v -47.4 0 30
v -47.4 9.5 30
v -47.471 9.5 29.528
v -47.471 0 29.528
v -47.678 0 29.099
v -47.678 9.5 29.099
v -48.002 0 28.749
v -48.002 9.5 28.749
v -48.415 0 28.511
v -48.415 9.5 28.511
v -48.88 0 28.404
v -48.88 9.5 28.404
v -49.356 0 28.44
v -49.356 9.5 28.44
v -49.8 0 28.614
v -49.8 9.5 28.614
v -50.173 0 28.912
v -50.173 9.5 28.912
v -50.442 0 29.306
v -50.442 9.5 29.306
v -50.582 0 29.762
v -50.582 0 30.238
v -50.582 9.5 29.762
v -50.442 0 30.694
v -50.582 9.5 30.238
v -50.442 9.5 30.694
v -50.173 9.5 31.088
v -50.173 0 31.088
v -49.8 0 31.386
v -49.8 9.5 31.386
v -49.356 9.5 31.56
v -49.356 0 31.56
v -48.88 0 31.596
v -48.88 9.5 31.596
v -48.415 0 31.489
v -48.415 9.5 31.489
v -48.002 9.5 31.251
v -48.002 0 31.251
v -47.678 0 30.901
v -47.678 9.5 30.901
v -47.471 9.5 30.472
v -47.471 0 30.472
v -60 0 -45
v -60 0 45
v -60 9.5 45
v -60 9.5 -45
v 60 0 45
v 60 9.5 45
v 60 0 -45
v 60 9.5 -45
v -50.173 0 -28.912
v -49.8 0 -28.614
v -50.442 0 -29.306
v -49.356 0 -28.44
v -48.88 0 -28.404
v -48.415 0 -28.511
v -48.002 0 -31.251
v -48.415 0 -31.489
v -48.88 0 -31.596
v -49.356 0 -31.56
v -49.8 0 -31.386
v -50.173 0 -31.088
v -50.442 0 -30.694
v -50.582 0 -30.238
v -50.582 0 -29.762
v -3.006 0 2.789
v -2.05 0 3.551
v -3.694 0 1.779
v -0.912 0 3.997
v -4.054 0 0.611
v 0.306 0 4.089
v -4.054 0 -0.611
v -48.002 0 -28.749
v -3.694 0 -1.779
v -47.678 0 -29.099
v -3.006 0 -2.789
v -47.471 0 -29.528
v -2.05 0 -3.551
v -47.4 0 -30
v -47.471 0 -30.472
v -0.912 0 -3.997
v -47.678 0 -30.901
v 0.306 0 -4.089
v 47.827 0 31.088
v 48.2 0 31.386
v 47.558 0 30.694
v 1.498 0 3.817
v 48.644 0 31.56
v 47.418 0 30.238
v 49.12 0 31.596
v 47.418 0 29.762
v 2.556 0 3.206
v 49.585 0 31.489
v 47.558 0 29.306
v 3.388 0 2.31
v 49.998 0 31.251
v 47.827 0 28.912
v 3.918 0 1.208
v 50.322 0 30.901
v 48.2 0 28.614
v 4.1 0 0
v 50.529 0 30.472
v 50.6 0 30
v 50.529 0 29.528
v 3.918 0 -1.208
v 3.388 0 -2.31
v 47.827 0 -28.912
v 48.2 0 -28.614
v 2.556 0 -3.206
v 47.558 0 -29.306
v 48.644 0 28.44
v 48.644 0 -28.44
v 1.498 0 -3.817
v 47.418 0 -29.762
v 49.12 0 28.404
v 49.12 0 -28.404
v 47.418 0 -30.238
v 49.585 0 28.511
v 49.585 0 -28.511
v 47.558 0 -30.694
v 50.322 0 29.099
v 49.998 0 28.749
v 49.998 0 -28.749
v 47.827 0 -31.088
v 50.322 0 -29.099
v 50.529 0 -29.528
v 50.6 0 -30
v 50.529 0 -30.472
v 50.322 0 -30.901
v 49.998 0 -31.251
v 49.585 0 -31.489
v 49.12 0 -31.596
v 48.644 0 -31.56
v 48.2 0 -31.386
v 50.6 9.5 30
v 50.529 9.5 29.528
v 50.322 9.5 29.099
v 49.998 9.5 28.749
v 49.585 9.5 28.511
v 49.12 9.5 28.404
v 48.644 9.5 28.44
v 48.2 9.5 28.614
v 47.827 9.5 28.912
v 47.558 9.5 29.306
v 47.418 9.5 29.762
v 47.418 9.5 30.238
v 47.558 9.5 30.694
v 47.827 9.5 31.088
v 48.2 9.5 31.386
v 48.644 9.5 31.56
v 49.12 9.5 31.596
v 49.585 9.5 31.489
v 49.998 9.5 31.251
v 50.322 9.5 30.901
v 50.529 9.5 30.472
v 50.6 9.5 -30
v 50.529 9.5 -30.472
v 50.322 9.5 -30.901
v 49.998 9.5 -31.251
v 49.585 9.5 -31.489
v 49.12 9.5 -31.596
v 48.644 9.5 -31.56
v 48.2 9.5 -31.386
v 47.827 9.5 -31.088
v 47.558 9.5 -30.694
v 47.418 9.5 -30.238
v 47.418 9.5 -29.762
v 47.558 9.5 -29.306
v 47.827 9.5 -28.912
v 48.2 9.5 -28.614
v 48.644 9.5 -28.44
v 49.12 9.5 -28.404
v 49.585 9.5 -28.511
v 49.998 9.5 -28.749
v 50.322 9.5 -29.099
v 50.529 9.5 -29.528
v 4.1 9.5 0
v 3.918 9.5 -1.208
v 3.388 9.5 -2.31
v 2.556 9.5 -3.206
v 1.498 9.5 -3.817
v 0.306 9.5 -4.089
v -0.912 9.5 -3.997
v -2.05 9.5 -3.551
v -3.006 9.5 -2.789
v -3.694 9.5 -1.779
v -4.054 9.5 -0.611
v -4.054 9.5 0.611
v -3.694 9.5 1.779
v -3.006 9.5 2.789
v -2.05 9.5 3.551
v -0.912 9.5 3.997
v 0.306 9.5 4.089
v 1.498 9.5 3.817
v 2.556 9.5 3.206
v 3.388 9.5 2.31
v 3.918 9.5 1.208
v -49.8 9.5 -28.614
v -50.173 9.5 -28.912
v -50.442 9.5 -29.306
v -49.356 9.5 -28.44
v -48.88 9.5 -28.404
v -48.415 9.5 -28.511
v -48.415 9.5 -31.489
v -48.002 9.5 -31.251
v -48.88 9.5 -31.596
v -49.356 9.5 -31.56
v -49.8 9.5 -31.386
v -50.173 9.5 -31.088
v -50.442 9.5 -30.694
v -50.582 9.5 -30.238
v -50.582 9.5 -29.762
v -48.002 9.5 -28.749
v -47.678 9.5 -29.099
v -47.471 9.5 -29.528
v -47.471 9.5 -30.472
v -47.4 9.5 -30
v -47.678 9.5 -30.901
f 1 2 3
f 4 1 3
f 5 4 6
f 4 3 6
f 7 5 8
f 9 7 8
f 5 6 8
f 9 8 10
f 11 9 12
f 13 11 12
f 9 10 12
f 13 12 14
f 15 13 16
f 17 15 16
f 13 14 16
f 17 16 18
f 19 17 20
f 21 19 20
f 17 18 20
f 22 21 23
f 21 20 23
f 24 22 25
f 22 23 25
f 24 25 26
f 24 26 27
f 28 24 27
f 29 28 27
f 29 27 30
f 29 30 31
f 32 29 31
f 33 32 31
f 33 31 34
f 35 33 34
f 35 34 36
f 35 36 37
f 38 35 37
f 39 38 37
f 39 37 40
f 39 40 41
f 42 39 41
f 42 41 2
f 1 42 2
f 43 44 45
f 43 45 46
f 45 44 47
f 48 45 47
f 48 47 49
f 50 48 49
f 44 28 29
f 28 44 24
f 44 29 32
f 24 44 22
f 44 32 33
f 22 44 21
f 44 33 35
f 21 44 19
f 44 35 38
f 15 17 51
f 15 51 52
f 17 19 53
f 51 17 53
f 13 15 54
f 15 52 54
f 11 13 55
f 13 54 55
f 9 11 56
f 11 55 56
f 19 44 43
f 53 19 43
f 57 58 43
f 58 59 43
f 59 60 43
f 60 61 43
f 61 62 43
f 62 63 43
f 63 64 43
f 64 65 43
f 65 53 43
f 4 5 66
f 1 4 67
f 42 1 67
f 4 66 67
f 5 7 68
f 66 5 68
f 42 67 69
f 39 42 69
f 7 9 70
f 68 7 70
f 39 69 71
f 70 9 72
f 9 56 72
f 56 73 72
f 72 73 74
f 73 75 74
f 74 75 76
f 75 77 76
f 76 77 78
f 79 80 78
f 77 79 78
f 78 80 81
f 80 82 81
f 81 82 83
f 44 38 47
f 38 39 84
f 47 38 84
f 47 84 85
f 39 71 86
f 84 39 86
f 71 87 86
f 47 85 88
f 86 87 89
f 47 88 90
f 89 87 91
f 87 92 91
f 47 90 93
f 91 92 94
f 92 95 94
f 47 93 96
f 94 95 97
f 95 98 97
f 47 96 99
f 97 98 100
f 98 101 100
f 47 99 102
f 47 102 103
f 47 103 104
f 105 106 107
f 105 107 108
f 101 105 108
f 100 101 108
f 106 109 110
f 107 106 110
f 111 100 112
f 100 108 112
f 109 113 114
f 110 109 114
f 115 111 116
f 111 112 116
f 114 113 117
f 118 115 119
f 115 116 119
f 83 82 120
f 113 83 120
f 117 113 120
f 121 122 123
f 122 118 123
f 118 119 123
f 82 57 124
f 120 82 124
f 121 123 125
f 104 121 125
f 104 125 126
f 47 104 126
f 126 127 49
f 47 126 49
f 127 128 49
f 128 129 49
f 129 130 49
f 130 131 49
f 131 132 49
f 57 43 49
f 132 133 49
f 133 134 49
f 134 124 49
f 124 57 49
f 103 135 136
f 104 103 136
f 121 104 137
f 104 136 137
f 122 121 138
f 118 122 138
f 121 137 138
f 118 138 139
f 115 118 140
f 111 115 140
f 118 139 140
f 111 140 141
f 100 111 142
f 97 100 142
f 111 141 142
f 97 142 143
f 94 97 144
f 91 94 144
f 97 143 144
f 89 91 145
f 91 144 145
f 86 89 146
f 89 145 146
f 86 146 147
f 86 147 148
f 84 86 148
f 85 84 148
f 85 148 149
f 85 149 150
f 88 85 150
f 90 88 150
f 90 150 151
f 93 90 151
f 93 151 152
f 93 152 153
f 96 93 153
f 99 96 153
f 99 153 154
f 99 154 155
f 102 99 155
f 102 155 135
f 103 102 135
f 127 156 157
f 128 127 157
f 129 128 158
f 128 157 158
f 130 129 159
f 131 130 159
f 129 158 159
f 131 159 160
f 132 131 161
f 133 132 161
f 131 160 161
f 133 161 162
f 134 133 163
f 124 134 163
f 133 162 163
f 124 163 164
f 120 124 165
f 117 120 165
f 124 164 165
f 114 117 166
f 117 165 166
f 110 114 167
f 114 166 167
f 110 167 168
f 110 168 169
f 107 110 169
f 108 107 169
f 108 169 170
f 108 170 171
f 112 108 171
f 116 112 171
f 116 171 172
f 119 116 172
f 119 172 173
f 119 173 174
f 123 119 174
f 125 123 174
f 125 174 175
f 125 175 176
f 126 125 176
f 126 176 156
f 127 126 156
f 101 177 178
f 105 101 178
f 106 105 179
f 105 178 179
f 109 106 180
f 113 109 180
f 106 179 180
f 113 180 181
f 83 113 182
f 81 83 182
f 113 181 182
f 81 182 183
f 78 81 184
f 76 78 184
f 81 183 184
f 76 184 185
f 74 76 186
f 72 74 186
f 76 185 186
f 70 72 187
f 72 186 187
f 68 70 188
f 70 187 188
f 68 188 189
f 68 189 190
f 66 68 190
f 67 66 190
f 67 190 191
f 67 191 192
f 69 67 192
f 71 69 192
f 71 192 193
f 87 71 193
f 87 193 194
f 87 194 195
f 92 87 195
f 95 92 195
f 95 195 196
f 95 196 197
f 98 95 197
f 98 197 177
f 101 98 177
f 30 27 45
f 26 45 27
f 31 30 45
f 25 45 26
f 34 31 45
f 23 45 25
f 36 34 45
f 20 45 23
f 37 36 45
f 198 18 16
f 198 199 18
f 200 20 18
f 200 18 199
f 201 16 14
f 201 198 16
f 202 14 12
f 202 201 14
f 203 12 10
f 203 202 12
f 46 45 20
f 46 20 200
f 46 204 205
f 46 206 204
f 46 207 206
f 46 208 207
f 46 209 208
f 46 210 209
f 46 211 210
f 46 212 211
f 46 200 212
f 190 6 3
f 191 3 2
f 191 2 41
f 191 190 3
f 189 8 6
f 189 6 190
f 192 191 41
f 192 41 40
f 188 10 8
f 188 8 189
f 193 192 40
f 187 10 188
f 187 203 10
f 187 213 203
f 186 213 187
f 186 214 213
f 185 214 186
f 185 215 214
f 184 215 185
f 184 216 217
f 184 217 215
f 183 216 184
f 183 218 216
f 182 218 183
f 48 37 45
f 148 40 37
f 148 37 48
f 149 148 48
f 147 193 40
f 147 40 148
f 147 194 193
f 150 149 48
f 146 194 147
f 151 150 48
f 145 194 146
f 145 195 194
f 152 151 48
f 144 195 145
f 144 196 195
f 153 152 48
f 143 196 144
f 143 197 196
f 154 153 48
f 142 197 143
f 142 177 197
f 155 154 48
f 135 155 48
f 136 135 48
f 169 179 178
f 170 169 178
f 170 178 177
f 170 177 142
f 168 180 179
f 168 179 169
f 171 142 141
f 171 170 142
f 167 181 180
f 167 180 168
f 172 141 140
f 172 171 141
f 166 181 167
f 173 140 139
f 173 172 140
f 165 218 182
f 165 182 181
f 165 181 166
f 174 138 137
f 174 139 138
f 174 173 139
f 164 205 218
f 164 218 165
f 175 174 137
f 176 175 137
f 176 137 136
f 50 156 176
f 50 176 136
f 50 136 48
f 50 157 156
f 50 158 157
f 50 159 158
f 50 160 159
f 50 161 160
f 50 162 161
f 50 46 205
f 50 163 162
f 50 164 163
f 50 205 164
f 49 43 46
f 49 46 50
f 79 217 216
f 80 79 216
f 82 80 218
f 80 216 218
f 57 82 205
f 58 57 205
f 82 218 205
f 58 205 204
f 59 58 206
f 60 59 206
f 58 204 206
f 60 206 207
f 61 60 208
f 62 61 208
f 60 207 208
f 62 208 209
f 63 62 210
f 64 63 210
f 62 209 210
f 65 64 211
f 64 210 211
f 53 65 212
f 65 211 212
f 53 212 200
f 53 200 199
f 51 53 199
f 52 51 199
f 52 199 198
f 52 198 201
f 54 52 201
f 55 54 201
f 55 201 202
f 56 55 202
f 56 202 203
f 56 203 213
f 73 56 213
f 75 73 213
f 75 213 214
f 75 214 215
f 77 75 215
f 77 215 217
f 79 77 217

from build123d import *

# Parameters (mm, degrees)
SKETCH1_W           = 120
SKETCH1_H           = 90
BOSS_EXTRUDE1_DEPTH = 9.5
SKETCH2_R           = 1.6
CUT_EXTRUDE1_DEPTH  = 10.5
SKETCH3_R           = 4.1
CUT_EXTRUDE2_DEPTH  = 10.5


with BuildPart() as part:
    # Sketch1 → Boss-Extrude1 (new body)
    with BuildSketch(Plane(origin=(0, 0, 0), x_dir=(1, 0, 0), z_dir=(0, 1, 0))):
        Rectangle(SKETCH1_W, SKETCH1_H)
    extrude(amount=BOSS_EXTRUDE1_DEPTH)

    # Sketch2 → Cut-Extrude1 (cut, through all)
    with BuildSketch(Plane(origin=(0, 9.5, 0), x_dir=(1, 0, 0), z_dir=(0, 1, 0))):
        with Locations((-49, -30)):
            Circle(SKETCH2_R)
        with Locations((49, -30)):
            Circle(SKETCH2_R)
        with Locations((49, 30)):
            Circle(SKETCH2_R)
        with Locations((-49, 30)):
            Circle(SKETCH2_R)
    extrude(amount=-CUT_EXTRUDE1_DEPTH, mode=Mode.SUBTRACT)

    # Sketch3 → Cut-Extrude2 (cut, through all)
    with BuildSketch(Plane(origin=(0, 9.5, 0), x_dir=(1, 0, 0), z_dir=(0, 1, 0))):
        Circle(SKETCH3_R)
    extrude(amount=-CUT_EXTRUDE2_DEPTH, mode=Mode.SUBTRACT)


solid = part.part
